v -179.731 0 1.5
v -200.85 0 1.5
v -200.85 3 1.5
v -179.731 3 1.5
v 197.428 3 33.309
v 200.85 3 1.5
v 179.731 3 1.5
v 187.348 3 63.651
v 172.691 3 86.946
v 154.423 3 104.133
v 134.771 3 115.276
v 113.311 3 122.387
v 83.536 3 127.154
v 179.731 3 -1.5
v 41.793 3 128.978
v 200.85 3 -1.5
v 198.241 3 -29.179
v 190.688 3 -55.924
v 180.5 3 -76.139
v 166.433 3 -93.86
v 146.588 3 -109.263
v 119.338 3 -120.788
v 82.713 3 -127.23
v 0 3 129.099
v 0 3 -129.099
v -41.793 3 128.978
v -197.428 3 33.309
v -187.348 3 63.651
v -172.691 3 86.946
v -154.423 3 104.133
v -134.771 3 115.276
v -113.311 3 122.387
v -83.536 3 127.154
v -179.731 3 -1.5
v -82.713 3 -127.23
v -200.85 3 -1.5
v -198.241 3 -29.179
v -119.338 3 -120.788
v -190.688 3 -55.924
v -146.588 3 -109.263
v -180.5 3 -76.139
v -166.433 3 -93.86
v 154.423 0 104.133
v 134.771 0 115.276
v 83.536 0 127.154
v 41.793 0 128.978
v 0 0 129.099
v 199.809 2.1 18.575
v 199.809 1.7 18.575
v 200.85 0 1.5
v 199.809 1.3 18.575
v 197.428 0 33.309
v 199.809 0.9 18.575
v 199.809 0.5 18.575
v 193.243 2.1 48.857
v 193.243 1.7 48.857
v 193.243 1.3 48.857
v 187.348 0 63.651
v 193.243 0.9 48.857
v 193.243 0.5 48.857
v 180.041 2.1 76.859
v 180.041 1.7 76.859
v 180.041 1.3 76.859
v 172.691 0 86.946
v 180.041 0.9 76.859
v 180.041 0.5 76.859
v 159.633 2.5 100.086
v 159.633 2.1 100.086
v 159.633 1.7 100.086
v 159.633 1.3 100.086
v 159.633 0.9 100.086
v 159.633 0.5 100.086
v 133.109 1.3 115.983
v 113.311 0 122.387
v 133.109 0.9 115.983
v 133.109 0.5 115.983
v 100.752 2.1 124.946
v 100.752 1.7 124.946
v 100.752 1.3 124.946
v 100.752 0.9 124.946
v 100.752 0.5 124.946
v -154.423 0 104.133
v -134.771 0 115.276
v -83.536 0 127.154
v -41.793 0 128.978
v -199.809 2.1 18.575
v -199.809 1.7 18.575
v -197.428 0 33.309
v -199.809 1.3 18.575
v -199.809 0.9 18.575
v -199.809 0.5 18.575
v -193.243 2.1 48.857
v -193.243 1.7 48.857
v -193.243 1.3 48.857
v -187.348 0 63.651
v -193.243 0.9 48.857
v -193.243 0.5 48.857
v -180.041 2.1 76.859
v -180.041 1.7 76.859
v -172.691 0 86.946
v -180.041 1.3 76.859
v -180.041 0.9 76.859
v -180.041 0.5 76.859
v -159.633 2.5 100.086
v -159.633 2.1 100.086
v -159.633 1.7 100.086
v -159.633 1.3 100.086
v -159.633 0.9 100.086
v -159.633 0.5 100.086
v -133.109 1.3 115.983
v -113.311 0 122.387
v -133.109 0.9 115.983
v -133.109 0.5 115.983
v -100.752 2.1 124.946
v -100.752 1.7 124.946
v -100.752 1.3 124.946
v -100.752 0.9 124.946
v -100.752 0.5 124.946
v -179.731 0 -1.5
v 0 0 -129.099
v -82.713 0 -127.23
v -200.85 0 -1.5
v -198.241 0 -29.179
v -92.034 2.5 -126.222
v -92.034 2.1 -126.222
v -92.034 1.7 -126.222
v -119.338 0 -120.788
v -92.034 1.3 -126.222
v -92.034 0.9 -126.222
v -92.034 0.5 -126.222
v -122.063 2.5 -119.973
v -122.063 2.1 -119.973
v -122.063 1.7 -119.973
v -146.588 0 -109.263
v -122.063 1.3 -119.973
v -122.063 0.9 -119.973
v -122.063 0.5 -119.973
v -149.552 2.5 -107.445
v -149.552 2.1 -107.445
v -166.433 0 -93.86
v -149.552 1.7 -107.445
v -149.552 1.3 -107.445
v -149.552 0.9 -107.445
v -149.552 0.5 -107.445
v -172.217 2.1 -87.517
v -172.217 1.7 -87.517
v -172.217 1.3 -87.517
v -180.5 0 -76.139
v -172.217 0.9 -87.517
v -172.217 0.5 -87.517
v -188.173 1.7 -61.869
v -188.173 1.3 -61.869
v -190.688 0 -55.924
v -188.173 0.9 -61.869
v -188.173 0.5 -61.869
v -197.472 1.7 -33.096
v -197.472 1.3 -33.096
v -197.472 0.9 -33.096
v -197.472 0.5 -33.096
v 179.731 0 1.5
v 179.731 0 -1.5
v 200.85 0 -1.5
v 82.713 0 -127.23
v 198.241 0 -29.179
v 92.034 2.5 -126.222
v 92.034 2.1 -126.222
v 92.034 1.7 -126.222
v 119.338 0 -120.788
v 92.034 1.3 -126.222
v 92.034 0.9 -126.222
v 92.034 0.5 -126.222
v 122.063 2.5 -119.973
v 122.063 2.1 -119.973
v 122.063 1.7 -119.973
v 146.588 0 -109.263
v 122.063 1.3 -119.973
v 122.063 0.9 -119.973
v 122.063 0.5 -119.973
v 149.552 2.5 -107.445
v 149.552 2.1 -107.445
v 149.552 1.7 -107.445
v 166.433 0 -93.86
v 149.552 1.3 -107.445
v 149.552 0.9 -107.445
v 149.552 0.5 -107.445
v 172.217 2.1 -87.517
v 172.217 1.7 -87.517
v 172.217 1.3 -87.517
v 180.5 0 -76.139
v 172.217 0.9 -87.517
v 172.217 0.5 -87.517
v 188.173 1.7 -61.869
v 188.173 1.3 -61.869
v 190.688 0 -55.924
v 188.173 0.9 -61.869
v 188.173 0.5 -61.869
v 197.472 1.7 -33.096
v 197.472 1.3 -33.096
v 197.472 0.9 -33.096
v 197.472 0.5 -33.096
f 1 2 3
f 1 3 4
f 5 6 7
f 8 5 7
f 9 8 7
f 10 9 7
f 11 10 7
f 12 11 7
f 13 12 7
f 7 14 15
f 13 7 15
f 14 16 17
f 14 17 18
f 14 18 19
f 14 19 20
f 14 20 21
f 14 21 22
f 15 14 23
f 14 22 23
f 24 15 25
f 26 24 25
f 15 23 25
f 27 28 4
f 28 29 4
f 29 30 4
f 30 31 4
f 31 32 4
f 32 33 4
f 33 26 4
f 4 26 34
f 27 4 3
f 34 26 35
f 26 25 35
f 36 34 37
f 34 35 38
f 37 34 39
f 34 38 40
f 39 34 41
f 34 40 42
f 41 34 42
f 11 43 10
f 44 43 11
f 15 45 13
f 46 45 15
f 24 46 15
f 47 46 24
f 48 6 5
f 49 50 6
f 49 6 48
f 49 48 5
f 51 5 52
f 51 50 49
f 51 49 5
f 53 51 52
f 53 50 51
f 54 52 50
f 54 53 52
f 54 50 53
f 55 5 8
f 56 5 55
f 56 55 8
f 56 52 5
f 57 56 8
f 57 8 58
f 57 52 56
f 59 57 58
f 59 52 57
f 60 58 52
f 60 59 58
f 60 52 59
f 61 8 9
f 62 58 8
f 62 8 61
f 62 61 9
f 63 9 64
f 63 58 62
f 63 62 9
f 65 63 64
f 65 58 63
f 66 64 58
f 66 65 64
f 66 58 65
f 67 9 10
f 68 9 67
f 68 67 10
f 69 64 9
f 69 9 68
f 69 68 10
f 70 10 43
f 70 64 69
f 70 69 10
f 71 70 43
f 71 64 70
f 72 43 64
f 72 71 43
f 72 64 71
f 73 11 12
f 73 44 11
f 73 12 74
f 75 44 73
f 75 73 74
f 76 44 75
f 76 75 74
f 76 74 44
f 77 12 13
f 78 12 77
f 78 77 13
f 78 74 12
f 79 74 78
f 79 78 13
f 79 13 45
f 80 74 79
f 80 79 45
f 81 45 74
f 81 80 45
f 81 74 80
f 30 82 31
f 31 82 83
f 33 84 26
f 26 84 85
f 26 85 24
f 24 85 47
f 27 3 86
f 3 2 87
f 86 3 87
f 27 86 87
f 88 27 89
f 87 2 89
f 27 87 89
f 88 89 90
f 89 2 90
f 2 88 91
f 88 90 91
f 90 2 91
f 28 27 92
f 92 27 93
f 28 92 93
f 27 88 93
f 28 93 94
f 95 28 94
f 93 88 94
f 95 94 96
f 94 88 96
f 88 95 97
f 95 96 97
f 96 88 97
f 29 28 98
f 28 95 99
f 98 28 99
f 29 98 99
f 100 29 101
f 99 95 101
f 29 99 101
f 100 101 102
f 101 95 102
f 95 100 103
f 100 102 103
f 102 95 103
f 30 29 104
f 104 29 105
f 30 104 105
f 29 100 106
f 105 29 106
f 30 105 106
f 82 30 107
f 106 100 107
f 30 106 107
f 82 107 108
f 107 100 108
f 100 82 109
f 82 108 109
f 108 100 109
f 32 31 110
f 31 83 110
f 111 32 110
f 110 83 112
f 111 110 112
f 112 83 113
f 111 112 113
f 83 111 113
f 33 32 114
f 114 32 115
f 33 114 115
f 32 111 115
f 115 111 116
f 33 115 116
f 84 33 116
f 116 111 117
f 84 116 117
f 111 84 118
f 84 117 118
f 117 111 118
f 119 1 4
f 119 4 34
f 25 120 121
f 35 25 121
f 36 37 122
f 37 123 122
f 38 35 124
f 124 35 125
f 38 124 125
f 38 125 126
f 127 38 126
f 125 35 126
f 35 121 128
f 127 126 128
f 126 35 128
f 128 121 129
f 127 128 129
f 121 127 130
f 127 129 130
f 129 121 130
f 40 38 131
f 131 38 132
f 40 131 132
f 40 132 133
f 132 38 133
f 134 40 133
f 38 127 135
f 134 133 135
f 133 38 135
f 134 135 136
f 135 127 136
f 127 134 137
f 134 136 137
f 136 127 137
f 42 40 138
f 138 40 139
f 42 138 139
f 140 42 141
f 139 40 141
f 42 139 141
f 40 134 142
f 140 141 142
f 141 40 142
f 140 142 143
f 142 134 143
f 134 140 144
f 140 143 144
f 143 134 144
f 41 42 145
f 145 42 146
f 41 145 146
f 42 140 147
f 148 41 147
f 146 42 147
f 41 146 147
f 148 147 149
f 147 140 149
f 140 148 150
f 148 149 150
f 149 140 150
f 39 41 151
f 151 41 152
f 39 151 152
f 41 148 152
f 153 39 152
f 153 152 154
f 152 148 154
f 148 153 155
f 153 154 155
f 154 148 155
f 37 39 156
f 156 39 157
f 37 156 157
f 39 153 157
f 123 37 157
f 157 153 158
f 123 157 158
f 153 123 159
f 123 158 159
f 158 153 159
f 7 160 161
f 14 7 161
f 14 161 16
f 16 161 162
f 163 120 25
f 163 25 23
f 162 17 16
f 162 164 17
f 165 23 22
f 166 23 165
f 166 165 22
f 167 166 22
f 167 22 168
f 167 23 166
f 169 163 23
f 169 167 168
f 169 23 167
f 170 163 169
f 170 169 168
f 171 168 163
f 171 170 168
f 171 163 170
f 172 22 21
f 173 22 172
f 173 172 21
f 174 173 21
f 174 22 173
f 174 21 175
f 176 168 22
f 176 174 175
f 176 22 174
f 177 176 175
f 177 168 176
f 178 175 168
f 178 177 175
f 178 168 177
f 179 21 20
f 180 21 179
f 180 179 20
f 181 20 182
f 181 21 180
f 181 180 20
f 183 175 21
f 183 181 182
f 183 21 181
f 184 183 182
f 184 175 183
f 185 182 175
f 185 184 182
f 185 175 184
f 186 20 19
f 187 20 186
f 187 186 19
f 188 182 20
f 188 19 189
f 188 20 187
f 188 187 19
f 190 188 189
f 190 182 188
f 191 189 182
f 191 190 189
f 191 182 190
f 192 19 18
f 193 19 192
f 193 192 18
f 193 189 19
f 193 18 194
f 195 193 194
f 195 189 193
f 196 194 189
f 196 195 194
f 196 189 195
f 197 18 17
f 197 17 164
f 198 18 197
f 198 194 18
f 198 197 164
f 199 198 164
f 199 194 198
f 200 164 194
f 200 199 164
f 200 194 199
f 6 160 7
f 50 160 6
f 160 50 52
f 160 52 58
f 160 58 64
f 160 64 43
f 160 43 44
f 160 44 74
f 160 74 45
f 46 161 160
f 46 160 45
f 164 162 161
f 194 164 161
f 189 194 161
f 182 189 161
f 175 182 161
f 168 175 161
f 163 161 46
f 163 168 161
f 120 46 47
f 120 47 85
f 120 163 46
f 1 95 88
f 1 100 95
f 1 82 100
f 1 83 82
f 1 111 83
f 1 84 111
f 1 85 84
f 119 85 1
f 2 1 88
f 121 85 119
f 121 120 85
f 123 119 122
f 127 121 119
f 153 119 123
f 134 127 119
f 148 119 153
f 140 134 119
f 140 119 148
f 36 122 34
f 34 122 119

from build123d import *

# Parameters (mm, degrees)
BOSS_EXTRUDE2_DEPTH = 3
SKETCH4_W           = 23.944295053
SKETCH4_H           = 3
CUT_EXTRUDE2_DEPTH  = 98
SKETCH5_W           = 27.333105753
SKETCH5_H           = 3
CUT_EXTRUDE3_DEPTH  = 39


with BuildPart() as part:
    # Sketch1 → Boss-Extrude2 (new body)
    with BuildSketch(Plane(origin=(0, 0, 0), x_dir=(1, 0, 0), z_dir=(0, 1, 0))):
        with BuildLine():
            add(Edge.make_bspline(
                [(0, 129.099444874), (4.329825716, 129.099856757), (12.989477034, 129.099521717), (25.976301205, 129.099245615), (43.290249676, 129.013980379), (60.600663959, 128.671189087), (77.894655735, 127.812916551), (95.543037977, 126.045988358), (113.01399335, 122.896019952), (130.046357946, 117.797143556), (146.158139311, 110.226946457), (160.431314667, 100.265018203), (172.693338202, 87.911885541), (182.663351285, 73.663423027), (190.340438043, 58.079107996), (195.865426103, 41.62272021), (199.400795759, 24.636185909), (201.069948812, 7.370686111), (200.935166589, -9.973525735), (198.991239132, -27.210718658), (195.166319776, -44.135428769), (189.328734448, -60.48538478), (181.314677982, -75.901802403), (170.994375318, -89.90233662), (157.866189481, -102.437720294), (141.967900724, -112.68294779), (124.642016349, -119.756709815), (106.708377896, -124.219228333), (88.446200884, -126.903428265), (70.051310284, -128.322663007), (45.62975056, -129.099776243), (25.349069661, -129.099346893), (10.139933531, -129.099445048), (-2.223e-06, -129.099444874)],
                knots=[0, 0, 0, 0, 0, 0.03122023, 0.062440461, 0.093641547, 0.124842633, 0.156052703, 0.187262773, 0.221451125, 0.252661674, 0.283871788, 0.315081907, 0.34629216, 0.377502474, 0.408712793, 0.439923128, 0.471133499, 0.502343874, 0.533554233, 0.564764591, 0.595974957, 0.627185296, 0.658395569, 0.689605838, 0.720816286, 0.757370802, 0.793925658, 0.823852077, 0.853778496, 0.890332223, 0.92688595, 1, 1, 1, 1, 1], degree=4))
            add(Edge.make_bspline(
                [(0, 129.099444874), (-4.329825716, 129.099856832), (-12.989477034, 129.099521941), (-25.976301205, 129.099246062), (-43.290249678, 129.013981124), (-60.600663967, 128.67119013), (-77.894655757, 127.812917893), (-95.543038029, 126.045990003), (-113.013993457, 122.896021898), (-130.04635814, 117.797145795), (-146.158139636, 110.226948973), (-160.431315164, 100.265020966), (-172.693338911, 87.911888514), (-182.663352239, 73.663426172), (-190.340439266, 58.079111273), (-195.865427609, 41.622723582), (-199.400797558, 24.636189342), (-201.069950908, 7.370689573), (-200.935168983, -9.973522276), (-198.991241823, -27.210715232), (-195.166322759, -44.135425409), (-189.328737713, -60.48538152), (-181.314681512, -75.901799281), (-170.994379089, -89.902333676), (-157.866193468, -102.437717576), (-141.967904887, -112.682945345), (-124.642020634, -119.756707669), (-106.708382258, -124.219226496), (-88.446205291, -126.903426743), (-70.051314717, -128.322661801), (-45.629755005, -129.099775457), (-25.349074106, -129.099346457), (-10.139937977, -129.099444874), (-2.223e-06, -129.099444874)],
                knots=[0, 0, 0, 0, 0, 0.03122023, 0.062440461, 0.093641547, 0.124842633, 0.156052703, 0.187262773, 0.221451125, 0.252661674, 0.283871788, 0.315081907, 0.34629216, 0.377502474, 0.408712793, 0.439923128, 0.471133499, 0.502343874, 0.533554233, 0.564764591, 0.595974957, 0.627185296, 0.658395569, 0.689605838, 0.720816286, 0.757370802, 0.793925658, 0.823852077, 0.853778496, 0.890332223, 0.92688595, 1, 1, 1, 1, 1], degree=4))
        make_face()
    extrude(amount=BOSS_EXTRUDE2_DEPTH)

    # Sketch4 → Cut-Extrude2 (cut)
    with BuildSketch(Plane(origin=(0, 0, 0), x_dir=(1, 0, 0), z_dir=(0, 1, 0))):
        with Locations((-191.702695575, 0)):
            Rectangle(SKETCH4_W, SKETCH4_H)
    extrude(amount=CUT_EXTRUDE2_DEPTH, mode=Mode.SUBTRACT)

    # Sketch5 → Cut-Extrude3 (cut)
    with BuildSketch(Plane(origin=(0, 0, 0), x_dir=(1, 0, 0), z_dir=(0, 1, 0))):
        with Locations((193.397098701, 0)):
            Rectangle(SKETCH5_W, SKETCH5_H)
    extrude(amount=CUT_EXTRUDE3_DEPTH, mode=Mode.SUBTRACT)


solid = part.part
